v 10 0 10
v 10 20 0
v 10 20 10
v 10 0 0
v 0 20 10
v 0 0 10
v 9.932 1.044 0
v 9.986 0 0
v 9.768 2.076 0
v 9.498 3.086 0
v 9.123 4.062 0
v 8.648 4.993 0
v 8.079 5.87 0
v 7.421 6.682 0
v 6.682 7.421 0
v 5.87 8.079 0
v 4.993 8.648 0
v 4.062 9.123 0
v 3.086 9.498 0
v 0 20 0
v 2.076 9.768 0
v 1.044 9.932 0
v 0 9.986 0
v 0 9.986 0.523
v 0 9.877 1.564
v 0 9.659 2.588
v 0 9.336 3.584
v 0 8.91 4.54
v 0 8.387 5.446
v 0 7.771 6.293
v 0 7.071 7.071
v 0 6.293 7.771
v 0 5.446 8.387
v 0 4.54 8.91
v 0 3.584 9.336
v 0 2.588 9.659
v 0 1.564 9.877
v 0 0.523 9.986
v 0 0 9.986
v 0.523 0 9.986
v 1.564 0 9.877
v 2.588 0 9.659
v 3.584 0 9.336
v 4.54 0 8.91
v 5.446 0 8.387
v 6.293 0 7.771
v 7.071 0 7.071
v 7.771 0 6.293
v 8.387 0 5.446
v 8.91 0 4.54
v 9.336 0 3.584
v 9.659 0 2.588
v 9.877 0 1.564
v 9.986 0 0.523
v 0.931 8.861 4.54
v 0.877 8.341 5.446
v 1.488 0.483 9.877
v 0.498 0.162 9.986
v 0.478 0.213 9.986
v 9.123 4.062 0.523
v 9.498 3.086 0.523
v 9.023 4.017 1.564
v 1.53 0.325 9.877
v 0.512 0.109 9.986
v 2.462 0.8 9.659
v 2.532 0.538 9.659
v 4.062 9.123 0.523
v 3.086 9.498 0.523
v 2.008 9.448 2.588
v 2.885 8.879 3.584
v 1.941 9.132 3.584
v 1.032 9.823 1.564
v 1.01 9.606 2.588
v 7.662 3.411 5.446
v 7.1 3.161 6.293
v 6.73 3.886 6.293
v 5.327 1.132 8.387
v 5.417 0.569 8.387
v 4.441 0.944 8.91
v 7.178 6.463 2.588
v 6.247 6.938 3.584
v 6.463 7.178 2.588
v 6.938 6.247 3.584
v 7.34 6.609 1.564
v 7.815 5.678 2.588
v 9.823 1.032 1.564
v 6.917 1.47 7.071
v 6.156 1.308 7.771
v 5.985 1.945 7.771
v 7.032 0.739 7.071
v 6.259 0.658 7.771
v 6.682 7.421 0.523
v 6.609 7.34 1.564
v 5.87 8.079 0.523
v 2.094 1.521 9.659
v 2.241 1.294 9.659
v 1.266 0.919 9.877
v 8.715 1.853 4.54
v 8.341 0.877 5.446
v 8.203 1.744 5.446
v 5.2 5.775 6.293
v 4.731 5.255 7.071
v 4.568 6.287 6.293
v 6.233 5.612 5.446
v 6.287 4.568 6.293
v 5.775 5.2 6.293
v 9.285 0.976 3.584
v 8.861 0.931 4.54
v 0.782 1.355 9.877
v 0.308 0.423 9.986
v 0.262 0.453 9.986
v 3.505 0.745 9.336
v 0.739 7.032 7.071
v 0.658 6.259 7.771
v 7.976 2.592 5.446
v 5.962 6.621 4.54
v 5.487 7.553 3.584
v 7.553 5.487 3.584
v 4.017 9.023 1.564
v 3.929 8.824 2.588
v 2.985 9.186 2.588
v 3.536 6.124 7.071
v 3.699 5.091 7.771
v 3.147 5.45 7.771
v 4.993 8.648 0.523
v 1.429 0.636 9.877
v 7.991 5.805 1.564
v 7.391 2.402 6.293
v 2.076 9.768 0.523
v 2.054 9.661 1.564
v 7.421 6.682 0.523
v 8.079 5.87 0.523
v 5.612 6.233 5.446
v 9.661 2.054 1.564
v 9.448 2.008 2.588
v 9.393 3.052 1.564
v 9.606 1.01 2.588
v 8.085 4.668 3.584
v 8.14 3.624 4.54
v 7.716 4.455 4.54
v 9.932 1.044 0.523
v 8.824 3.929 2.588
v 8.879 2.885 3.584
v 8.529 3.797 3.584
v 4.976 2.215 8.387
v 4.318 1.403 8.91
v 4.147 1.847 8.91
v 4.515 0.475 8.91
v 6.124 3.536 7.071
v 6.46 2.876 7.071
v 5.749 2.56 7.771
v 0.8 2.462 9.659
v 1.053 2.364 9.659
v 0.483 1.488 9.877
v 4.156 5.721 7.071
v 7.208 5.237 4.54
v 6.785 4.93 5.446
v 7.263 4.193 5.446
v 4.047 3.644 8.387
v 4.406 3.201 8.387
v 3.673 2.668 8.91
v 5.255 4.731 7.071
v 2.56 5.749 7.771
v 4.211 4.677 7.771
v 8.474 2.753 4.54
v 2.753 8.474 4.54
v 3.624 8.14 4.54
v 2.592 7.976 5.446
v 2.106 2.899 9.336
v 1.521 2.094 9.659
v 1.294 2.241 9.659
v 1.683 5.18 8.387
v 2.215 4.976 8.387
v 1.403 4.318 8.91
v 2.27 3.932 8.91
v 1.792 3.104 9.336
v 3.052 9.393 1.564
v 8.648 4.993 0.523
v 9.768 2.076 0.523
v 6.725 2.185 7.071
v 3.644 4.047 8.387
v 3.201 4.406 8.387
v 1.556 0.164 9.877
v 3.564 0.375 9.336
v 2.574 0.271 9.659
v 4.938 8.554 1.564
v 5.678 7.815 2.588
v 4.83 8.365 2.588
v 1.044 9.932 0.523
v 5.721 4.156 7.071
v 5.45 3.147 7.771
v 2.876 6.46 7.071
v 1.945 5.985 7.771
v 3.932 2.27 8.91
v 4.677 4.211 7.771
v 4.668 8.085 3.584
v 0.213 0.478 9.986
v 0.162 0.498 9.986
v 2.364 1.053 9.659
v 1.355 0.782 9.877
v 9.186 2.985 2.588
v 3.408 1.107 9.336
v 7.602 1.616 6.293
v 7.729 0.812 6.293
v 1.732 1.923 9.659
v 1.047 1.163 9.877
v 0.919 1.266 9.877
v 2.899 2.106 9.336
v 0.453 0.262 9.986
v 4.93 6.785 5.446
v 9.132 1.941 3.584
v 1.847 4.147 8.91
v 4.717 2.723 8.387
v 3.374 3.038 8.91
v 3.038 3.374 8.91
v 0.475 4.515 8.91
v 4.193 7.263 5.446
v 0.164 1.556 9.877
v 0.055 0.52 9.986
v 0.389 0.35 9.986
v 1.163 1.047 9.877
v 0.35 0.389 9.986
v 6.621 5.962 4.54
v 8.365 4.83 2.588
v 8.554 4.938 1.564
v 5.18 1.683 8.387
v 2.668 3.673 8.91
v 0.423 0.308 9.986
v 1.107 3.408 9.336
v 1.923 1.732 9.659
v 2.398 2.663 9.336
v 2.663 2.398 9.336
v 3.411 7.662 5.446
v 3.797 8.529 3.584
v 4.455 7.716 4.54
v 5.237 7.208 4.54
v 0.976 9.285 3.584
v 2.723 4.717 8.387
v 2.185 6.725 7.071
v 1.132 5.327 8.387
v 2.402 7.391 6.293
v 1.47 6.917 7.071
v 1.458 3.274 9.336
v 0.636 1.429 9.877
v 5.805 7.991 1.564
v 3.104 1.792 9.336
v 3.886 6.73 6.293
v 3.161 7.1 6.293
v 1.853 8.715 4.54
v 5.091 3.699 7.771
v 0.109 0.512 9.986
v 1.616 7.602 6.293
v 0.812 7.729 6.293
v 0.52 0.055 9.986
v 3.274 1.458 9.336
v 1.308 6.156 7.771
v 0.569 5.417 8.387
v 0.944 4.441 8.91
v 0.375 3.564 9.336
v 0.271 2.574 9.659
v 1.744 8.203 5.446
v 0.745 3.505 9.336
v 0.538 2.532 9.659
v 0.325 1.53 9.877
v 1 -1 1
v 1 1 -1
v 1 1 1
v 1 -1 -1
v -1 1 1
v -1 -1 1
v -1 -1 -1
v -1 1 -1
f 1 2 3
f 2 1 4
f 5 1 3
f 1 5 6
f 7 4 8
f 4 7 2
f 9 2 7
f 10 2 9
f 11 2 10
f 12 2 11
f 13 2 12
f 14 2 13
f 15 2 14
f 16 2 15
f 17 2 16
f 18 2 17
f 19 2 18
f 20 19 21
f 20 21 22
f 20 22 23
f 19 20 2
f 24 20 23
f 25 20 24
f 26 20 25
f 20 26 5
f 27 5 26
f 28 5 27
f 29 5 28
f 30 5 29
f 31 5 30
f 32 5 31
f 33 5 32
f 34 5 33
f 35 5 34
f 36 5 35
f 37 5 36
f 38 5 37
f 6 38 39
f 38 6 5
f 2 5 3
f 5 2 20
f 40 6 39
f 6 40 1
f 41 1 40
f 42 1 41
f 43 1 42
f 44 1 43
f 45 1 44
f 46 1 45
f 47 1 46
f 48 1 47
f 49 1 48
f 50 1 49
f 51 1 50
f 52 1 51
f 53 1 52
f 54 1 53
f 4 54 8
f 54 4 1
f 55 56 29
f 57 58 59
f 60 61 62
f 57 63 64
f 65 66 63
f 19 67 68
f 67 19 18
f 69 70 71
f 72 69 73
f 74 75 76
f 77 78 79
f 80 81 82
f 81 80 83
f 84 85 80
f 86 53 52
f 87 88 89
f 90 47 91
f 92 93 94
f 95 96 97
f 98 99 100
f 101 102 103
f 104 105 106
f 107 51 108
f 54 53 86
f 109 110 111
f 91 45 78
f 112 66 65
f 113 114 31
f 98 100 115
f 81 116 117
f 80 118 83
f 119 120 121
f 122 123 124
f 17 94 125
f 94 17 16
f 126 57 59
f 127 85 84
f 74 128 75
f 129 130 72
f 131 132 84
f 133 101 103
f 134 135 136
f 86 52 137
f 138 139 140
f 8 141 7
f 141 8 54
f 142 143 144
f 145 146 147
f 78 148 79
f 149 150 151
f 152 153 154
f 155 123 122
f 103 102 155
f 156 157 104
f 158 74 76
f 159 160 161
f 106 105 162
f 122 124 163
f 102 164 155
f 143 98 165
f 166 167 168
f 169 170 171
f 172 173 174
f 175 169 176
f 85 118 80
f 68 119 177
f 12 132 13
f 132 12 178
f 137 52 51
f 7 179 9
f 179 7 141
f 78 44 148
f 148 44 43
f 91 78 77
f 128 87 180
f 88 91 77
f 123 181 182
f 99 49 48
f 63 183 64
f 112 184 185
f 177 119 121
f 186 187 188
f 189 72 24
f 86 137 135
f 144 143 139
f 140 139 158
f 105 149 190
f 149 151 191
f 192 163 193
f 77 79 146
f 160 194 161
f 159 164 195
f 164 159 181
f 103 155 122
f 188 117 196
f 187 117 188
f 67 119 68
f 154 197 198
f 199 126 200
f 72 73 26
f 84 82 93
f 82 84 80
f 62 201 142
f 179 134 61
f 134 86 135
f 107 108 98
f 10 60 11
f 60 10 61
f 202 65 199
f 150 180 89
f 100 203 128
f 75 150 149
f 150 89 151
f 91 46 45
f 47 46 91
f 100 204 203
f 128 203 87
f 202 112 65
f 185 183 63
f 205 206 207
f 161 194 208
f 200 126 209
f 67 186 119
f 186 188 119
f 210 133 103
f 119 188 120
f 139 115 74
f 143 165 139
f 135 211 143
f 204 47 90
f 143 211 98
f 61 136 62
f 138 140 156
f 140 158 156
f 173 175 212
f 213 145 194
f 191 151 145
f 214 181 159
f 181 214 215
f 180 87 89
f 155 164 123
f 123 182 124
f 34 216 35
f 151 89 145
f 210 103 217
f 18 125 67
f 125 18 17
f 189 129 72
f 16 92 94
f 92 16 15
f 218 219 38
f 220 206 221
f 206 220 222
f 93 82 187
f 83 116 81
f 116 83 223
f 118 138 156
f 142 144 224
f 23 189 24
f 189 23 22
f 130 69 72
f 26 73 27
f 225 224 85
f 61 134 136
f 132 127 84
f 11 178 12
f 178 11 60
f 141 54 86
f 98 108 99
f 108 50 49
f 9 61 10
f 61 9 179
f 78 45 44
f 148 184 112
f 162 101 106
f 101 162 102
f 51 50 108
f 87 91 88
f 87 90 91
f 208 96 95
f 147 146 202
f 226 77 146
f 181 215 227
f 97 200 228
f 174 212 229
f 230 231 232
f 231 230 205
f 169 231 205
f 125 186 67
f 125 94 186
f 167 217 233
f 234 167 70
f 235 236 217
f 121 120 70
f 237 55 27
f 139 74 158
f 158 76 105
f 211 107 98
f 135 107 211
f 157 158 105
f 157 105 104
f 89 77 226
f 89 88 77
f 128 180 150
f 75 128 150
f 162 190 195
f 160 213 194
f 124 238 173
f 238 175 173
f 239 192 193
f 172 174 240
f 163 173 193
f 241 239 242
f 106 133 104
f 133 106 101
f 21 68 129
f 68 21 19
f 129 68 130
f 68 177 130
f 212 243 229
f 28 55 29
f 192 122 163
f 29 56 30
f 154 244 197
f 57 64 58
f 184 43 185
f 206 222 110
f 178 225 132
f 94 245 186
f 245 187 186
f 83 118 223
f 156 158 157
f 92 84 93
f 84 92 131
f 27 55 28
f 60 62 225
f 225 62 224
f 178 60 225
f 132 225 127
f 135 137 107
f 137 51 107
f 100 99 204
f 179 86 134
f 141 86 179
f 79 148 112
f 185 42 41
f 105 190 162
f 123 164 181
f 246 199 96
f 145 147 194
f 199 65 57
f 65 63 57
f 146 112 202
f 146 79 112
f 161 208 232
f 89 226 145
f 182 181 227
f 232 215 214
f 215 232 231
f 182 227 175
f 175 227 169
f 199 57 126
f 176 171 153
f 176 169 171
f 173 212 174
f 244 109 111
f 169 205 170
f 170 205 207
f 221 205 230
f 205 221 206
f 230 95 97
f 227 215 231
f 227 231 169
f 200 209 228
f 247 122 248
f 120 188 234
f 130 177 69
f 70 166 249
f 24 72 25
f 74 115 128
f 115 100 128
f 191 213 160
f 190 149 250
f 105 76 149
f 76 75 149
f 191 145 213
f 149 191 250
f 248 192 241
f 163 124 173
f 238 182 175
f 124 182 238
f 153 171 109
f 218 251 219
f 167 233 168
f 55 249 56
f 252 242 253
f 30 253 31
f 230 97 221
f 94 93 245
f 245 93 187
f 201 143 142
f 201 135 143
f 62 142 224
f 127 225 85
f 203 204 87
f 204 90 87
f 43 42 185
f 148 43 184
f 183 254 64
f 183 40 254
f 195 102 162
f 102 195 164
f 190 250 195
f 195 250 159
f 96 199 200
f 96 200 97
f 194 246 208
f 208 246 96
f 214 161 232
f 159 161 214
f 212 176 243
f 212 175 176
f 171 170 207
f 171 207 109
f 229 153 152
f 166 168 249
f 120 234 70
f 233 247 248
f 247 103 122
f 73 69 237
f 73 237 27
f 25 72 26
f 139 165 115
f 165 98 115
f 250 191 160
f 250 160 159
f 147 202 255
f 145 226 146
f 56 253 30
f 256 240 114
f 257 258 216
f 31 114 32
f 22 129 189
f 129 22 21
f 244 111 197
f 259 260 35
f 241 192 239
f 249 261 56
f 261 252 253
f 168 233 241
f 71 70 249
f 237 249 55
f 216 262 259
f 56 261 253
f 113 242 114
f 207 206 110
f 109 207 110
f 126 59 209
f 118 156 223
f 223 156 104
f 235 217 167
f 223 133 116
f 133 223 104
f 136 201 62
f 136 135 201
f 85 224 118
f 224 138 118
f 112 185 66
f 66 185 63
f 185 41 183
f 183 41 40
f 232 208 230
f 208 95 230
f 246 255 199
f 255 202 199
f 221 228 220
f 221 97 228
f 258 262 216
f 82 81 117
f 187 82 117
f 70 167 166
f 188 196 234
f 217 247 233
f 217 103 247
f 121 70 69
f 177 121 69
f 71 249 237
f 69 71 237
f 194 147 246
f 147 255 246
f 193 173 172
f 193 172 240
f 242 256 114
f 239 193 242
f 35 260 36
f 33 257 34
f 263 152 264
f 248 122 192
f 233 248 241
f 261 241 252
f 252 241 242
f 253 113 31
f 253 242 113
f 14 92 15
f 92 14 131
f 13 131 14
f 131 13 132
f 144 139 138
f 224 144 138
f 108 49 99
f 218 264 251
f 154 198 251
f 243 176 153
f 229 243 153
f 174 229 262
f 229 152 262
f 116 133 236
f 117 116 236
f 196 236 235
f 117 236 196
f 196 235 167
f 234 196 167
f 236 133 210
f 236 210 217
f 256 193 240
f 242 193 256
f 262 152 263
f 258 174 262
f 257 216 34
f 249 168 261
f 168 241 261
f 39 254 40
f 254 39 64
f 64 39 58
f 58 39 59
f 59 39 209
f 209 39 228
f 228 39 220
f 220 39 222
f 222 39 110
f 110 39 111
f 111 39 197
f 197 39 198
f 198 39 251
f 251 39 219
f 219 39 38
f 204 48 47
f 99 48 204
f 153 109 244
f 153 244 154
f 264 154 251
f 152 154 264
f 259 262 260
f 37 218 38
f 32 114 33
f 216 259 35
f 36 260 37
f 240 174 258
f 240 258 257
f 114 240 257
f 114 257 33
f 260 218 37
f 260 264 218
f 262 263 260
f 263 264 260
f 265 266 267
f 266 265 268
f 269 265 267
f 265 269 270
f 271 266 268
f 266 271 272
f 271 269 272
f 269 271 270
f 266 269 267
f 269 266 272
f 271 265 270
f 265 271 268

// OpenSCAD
$fs=0.25;$fa=6;
union() {
difference(){translate([5,10,5])cube([10,20,10],center=true);
sphere(r=10);
}union() {
cube([2,2,2],center=true);
cube([2,2,2],center=true);
cube([2,2,2],center=true);
cube([2,2,2],center=true);
cube([2,2,2],center=true);
cube([2,2,2],center=true);
cube([2,2,2],center=true);
cube([2,2,2],center=true);
}
}
